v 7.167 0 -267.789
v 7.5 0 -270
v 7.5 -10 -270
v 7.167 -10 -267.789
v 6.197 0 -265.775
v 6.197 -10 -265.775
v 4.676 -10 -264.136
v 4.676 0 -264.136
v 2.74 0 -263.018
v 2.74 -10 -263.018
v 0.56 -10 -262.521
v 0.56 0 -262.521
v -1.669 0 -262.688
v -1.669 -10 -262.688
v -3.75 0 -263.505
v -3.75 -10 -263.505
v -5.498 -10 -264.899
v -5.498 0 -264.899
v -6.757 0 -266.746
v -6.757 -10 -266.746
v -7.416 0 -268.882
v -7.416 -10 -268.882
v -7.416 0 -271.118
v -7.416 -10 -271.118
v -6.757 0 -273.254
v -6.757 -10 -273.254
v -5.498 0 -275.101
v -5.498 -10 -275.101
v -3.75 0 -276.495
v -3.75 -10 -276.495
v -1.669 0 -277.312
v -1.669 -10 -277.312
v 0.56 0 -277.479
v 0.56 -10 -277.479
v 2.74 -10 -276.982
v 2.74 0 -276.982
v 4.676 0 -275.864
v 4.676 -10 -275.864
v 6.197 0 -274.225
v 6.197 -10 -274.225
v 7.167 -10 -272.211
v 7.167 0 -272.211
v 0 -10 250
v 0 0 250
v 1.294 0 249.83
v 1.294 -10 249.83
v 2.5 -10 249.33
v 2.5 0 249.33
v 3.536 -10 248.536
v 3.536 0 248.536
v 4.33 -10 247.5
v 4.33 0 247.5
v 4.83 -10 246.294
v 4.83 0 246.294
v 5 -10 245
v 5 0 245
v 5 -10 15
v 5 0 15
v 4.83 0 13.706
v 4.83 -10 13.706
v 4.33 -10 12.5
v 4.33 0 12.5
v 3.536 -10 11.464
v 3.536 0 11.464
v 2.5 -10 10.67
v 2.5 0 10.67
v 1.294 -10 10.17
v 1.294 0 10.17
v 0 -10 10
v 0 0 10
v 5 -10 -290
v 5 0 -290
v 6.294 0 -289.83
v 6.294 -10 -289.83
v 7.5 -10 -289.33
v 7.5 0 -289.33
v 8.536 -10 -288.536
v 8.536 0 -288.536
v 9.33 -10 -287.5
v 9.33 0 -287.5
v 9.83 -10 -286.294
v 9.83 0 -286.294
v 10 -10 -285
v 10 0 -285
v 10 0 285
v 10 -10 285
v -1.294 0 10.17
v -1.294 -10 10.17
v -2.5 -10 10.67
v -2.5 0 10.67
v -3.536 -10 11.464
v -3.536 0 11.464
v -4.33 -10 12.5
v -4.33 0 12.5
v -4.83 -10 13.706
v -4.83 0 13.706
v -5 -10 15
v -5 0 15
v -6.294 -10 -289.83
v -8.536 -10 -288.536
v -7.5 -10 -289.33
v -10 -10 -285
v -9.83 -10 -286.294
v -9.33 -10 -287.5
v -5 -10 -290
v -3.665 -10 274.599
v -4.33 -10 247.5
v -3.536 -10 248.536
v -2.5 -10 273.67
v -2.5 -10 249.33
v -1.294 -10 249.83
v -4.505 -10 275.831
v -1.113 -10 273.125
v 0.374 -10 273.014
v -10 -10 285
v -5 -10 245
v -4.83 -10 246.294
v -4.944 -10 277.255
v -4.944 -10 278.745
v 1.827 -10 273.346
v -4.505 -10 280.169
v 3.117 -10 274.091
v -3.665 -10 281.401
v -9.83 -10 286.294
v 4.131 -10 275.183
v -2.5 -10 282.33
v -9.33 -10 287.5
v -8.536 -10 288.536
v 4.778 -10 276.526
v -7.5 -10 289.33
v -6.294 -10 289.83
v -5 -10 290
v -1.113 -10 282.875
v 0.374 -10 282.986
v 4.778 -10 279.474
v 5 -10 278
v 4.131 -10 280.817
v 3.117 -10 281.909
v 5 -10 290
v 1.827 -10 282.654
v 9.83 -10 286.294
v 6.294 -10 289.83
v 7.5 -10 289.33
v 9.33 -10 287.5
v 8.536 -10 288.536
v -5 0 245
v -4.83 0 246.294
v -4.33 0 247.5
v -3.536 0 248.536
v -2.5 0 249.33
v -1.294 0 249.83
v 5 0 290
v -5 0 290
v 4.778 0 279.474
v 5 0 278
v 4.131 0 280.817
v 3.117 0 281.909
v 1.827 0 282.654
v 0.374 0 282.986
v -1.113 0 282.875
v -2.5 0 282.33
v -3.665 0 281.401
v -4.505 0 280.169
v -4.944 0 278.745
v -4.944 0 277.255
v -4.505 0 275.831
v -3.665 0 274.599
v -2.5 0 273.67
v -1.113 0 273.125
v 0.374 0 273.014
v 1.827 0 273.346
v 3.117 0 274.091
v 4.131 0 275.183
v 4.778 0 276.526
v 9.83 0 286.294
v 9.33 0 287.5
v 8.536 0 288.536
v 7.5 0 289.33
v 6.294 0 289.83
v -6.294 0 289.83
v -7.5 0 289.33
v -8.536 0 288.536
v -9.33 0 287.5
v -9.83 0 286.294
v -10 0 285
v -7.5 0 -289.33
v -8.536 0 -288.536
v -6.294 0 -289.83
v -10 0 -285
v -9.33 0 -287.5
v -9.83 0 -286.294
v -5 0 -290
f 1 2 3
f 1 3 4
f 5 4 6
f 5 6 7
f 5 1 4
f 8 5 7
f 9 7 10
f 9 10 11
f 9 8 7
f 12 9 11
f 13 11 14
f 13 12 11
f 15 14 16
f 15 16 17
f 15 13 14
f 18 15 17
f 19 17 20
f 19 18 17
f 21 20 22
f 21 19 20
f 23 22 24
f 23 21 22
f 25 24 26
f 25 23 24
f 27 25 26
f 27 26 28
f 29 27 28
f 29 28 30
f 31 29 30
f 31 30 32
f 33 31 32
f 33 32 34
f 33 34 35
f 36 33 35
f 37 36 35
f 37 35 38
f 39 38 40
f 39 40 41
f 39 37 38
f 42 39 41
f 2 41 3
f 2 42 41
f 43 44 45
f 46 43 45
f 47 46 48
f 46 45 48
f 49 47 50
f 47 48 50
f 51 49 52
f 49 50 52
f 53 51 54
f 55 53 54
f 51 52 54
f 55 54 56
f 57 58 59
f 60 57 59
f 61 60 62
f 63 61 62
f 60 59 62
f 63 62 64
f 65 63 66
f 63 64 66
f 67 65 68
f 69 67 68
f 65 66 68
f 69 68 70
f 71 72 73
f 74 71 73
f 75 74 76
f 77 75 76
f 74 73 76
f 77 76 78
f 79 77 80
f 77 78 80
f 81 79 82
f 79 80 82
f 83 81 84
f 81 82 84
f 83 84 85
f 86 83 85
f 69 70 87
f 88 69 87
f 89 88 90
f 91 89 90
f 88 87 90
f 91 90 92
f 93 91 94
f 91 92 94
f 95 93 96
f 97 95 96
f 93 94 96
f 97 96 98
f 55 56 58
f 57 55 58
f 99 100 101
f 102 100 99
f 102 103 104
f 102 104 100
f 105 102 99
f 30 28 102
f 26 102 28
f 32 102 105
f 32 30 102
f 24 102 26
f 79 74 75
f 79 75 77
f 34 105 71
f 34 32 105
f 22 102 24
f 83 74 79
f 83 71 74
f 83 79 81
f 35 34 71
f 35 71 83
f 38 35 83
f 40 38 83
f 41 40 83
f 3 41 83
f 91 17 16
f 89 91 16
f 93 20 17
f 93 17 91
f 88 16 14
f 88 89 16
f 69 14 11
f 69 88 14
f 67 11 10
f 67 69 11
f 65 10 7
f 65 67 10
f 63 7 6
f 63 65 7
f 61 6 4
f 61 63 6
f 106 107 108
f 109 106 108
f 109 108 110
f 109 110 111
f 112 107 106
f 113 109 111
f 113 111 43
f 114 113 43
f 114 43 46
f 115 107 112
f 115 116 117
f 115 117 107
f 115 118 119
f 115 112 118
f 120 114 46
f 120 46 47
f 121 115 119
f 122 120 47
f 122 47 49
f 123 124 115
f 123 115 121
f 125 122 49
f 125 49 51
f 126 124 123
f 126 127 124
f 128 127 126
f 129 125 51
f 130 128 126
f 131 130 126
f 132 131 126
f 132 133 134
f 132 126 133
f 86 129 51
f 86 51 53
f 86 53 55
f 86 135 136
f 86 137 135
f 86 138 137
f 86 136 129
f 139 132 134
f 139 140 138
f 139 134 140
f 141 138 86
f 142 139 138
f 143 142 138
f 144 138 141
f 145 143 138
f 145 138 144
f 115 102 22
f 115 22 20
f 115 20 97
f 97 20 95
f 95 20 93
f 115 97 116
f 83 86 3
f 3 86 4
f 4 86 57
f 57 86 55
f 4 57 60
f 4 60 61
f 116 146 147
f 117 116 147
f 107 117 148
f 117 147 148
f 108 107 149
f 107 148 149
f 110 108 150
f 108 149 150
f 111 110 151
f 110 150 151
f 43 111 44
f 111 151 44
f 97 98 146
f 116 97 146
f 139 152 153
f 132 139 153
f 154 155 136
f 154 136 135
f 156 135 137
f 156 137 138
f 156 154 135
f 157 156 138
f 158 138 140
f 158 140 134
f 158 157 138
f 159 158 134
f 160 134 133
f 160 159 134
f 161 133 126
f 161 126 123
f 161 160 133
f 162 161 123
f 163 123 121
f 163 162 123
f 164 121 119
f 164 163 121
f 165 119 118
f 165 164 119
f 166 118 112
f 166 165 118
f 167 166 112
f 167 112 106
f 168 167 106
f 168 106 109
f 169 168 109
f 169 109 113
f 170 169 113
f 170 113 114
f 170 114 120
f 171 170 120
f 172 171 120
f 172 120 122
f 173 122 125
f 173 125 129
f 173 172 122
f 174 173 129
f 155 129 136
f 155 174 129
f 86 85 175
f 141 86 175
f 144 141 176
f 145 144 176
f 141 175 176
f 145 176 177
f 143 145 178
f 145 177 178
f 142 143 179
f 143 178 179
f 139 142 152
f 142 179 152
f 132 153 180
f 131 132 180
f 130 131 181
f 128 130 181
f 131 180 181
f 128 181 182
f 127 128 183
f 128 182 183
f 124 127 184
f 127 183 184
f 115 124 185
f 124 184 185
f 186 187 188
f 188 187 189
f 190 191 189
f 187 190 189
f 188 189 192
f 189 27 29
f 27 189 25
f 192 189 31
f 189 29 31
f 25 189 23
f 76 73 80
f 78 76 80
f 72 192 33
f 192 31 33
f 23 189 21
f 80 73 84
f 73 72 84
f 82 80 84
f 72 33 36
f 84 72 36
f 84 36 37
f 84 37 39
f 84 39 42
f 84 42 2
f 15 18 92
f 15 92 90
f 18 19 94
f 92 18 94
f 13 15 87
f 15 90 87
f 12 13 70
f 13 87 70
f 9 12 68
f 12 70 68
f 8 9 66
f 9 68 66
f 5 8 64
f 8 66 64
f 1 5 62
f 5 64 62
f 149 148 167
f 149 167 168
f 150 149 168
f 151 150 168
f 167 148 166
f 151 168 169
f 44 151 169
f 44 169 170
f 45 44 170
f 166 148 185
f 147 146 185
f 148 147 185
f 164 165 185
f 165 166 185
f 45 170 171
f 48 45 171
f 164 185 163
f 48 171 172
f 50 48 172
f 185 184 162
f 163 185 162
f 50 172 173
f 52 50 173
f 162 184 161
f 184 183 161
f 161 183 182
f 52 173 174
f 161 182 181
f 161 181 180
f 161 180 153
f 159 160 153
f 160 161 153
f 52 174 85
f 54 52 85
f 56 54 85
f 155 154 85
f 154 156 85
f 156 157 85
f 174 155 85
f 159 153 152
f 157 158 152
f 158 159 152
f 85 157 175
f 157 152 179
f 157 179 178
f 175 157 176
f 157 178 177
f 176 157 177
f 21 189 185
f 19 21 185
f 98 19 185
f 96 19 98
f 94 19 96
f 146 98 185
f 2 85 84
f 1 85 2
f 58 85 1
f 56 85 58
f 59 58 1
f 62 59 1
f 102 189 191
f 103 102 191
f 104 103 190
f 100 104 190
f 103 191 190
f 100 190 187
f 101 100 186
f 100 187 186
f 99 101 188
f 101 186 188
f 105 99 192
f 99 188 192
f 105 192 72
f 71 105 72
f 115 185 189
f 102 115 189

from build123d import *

# Parameters (mm, degrees)
F0_R     = 7.5
F0_R_2   = 5
F1_DEPTH = 10


with BuildPart() as f1:
    # F0 (on Front) → F1 (new body)
    with BuildSketch(Plane.XZ):
        with BuildLine():
            ThreePointArc((10, 285), (8.535534, 288.535534), (5, 290))
            Line((5, 290), (-5, 290))
            ThreePointArc((-5, 290), (-8.535534, 288.535534), (-10, 285))
            Line((-10, 285), (-10, -285))
            ThreePointArc((-10, -285), (-8.535534, -288.535534), (-5, -290))
            Line((-5, -290), (5, -290))
            ThreePointArc((5, -290), (8.535534, -288.535534), (10, -285))
            Line((10, -285), (10, 285))
        make_face()
        with Locations((0, -270)):
            Circle(F0_R, mode=Mode.SUBTRACT)
        with BuildLine():
            Line((5, 245), (5, 15))
            ThreePointArc((5, 15), (3.535534, 11.464466), (0, 10))
            ThreePointArc((0, 10), (-3.535534, 11.464466), (-5, 15))
            Line((-5, 15), (-5, 245))
            ThreePointArc((-5, 245), (-3.535534, 248.535534), (0, 250))
            ThreePointArc((0, 250), (3.535534, 248.535534), (5, 245))
        make_face(mode=Mode.SUBTRACT)
        with Locations((0, 278)):
            Circle(F0_R_2, mode=Mode.SUBTRACT)
    extrude(amount=F1_DEPTH)


solid = f1.part
